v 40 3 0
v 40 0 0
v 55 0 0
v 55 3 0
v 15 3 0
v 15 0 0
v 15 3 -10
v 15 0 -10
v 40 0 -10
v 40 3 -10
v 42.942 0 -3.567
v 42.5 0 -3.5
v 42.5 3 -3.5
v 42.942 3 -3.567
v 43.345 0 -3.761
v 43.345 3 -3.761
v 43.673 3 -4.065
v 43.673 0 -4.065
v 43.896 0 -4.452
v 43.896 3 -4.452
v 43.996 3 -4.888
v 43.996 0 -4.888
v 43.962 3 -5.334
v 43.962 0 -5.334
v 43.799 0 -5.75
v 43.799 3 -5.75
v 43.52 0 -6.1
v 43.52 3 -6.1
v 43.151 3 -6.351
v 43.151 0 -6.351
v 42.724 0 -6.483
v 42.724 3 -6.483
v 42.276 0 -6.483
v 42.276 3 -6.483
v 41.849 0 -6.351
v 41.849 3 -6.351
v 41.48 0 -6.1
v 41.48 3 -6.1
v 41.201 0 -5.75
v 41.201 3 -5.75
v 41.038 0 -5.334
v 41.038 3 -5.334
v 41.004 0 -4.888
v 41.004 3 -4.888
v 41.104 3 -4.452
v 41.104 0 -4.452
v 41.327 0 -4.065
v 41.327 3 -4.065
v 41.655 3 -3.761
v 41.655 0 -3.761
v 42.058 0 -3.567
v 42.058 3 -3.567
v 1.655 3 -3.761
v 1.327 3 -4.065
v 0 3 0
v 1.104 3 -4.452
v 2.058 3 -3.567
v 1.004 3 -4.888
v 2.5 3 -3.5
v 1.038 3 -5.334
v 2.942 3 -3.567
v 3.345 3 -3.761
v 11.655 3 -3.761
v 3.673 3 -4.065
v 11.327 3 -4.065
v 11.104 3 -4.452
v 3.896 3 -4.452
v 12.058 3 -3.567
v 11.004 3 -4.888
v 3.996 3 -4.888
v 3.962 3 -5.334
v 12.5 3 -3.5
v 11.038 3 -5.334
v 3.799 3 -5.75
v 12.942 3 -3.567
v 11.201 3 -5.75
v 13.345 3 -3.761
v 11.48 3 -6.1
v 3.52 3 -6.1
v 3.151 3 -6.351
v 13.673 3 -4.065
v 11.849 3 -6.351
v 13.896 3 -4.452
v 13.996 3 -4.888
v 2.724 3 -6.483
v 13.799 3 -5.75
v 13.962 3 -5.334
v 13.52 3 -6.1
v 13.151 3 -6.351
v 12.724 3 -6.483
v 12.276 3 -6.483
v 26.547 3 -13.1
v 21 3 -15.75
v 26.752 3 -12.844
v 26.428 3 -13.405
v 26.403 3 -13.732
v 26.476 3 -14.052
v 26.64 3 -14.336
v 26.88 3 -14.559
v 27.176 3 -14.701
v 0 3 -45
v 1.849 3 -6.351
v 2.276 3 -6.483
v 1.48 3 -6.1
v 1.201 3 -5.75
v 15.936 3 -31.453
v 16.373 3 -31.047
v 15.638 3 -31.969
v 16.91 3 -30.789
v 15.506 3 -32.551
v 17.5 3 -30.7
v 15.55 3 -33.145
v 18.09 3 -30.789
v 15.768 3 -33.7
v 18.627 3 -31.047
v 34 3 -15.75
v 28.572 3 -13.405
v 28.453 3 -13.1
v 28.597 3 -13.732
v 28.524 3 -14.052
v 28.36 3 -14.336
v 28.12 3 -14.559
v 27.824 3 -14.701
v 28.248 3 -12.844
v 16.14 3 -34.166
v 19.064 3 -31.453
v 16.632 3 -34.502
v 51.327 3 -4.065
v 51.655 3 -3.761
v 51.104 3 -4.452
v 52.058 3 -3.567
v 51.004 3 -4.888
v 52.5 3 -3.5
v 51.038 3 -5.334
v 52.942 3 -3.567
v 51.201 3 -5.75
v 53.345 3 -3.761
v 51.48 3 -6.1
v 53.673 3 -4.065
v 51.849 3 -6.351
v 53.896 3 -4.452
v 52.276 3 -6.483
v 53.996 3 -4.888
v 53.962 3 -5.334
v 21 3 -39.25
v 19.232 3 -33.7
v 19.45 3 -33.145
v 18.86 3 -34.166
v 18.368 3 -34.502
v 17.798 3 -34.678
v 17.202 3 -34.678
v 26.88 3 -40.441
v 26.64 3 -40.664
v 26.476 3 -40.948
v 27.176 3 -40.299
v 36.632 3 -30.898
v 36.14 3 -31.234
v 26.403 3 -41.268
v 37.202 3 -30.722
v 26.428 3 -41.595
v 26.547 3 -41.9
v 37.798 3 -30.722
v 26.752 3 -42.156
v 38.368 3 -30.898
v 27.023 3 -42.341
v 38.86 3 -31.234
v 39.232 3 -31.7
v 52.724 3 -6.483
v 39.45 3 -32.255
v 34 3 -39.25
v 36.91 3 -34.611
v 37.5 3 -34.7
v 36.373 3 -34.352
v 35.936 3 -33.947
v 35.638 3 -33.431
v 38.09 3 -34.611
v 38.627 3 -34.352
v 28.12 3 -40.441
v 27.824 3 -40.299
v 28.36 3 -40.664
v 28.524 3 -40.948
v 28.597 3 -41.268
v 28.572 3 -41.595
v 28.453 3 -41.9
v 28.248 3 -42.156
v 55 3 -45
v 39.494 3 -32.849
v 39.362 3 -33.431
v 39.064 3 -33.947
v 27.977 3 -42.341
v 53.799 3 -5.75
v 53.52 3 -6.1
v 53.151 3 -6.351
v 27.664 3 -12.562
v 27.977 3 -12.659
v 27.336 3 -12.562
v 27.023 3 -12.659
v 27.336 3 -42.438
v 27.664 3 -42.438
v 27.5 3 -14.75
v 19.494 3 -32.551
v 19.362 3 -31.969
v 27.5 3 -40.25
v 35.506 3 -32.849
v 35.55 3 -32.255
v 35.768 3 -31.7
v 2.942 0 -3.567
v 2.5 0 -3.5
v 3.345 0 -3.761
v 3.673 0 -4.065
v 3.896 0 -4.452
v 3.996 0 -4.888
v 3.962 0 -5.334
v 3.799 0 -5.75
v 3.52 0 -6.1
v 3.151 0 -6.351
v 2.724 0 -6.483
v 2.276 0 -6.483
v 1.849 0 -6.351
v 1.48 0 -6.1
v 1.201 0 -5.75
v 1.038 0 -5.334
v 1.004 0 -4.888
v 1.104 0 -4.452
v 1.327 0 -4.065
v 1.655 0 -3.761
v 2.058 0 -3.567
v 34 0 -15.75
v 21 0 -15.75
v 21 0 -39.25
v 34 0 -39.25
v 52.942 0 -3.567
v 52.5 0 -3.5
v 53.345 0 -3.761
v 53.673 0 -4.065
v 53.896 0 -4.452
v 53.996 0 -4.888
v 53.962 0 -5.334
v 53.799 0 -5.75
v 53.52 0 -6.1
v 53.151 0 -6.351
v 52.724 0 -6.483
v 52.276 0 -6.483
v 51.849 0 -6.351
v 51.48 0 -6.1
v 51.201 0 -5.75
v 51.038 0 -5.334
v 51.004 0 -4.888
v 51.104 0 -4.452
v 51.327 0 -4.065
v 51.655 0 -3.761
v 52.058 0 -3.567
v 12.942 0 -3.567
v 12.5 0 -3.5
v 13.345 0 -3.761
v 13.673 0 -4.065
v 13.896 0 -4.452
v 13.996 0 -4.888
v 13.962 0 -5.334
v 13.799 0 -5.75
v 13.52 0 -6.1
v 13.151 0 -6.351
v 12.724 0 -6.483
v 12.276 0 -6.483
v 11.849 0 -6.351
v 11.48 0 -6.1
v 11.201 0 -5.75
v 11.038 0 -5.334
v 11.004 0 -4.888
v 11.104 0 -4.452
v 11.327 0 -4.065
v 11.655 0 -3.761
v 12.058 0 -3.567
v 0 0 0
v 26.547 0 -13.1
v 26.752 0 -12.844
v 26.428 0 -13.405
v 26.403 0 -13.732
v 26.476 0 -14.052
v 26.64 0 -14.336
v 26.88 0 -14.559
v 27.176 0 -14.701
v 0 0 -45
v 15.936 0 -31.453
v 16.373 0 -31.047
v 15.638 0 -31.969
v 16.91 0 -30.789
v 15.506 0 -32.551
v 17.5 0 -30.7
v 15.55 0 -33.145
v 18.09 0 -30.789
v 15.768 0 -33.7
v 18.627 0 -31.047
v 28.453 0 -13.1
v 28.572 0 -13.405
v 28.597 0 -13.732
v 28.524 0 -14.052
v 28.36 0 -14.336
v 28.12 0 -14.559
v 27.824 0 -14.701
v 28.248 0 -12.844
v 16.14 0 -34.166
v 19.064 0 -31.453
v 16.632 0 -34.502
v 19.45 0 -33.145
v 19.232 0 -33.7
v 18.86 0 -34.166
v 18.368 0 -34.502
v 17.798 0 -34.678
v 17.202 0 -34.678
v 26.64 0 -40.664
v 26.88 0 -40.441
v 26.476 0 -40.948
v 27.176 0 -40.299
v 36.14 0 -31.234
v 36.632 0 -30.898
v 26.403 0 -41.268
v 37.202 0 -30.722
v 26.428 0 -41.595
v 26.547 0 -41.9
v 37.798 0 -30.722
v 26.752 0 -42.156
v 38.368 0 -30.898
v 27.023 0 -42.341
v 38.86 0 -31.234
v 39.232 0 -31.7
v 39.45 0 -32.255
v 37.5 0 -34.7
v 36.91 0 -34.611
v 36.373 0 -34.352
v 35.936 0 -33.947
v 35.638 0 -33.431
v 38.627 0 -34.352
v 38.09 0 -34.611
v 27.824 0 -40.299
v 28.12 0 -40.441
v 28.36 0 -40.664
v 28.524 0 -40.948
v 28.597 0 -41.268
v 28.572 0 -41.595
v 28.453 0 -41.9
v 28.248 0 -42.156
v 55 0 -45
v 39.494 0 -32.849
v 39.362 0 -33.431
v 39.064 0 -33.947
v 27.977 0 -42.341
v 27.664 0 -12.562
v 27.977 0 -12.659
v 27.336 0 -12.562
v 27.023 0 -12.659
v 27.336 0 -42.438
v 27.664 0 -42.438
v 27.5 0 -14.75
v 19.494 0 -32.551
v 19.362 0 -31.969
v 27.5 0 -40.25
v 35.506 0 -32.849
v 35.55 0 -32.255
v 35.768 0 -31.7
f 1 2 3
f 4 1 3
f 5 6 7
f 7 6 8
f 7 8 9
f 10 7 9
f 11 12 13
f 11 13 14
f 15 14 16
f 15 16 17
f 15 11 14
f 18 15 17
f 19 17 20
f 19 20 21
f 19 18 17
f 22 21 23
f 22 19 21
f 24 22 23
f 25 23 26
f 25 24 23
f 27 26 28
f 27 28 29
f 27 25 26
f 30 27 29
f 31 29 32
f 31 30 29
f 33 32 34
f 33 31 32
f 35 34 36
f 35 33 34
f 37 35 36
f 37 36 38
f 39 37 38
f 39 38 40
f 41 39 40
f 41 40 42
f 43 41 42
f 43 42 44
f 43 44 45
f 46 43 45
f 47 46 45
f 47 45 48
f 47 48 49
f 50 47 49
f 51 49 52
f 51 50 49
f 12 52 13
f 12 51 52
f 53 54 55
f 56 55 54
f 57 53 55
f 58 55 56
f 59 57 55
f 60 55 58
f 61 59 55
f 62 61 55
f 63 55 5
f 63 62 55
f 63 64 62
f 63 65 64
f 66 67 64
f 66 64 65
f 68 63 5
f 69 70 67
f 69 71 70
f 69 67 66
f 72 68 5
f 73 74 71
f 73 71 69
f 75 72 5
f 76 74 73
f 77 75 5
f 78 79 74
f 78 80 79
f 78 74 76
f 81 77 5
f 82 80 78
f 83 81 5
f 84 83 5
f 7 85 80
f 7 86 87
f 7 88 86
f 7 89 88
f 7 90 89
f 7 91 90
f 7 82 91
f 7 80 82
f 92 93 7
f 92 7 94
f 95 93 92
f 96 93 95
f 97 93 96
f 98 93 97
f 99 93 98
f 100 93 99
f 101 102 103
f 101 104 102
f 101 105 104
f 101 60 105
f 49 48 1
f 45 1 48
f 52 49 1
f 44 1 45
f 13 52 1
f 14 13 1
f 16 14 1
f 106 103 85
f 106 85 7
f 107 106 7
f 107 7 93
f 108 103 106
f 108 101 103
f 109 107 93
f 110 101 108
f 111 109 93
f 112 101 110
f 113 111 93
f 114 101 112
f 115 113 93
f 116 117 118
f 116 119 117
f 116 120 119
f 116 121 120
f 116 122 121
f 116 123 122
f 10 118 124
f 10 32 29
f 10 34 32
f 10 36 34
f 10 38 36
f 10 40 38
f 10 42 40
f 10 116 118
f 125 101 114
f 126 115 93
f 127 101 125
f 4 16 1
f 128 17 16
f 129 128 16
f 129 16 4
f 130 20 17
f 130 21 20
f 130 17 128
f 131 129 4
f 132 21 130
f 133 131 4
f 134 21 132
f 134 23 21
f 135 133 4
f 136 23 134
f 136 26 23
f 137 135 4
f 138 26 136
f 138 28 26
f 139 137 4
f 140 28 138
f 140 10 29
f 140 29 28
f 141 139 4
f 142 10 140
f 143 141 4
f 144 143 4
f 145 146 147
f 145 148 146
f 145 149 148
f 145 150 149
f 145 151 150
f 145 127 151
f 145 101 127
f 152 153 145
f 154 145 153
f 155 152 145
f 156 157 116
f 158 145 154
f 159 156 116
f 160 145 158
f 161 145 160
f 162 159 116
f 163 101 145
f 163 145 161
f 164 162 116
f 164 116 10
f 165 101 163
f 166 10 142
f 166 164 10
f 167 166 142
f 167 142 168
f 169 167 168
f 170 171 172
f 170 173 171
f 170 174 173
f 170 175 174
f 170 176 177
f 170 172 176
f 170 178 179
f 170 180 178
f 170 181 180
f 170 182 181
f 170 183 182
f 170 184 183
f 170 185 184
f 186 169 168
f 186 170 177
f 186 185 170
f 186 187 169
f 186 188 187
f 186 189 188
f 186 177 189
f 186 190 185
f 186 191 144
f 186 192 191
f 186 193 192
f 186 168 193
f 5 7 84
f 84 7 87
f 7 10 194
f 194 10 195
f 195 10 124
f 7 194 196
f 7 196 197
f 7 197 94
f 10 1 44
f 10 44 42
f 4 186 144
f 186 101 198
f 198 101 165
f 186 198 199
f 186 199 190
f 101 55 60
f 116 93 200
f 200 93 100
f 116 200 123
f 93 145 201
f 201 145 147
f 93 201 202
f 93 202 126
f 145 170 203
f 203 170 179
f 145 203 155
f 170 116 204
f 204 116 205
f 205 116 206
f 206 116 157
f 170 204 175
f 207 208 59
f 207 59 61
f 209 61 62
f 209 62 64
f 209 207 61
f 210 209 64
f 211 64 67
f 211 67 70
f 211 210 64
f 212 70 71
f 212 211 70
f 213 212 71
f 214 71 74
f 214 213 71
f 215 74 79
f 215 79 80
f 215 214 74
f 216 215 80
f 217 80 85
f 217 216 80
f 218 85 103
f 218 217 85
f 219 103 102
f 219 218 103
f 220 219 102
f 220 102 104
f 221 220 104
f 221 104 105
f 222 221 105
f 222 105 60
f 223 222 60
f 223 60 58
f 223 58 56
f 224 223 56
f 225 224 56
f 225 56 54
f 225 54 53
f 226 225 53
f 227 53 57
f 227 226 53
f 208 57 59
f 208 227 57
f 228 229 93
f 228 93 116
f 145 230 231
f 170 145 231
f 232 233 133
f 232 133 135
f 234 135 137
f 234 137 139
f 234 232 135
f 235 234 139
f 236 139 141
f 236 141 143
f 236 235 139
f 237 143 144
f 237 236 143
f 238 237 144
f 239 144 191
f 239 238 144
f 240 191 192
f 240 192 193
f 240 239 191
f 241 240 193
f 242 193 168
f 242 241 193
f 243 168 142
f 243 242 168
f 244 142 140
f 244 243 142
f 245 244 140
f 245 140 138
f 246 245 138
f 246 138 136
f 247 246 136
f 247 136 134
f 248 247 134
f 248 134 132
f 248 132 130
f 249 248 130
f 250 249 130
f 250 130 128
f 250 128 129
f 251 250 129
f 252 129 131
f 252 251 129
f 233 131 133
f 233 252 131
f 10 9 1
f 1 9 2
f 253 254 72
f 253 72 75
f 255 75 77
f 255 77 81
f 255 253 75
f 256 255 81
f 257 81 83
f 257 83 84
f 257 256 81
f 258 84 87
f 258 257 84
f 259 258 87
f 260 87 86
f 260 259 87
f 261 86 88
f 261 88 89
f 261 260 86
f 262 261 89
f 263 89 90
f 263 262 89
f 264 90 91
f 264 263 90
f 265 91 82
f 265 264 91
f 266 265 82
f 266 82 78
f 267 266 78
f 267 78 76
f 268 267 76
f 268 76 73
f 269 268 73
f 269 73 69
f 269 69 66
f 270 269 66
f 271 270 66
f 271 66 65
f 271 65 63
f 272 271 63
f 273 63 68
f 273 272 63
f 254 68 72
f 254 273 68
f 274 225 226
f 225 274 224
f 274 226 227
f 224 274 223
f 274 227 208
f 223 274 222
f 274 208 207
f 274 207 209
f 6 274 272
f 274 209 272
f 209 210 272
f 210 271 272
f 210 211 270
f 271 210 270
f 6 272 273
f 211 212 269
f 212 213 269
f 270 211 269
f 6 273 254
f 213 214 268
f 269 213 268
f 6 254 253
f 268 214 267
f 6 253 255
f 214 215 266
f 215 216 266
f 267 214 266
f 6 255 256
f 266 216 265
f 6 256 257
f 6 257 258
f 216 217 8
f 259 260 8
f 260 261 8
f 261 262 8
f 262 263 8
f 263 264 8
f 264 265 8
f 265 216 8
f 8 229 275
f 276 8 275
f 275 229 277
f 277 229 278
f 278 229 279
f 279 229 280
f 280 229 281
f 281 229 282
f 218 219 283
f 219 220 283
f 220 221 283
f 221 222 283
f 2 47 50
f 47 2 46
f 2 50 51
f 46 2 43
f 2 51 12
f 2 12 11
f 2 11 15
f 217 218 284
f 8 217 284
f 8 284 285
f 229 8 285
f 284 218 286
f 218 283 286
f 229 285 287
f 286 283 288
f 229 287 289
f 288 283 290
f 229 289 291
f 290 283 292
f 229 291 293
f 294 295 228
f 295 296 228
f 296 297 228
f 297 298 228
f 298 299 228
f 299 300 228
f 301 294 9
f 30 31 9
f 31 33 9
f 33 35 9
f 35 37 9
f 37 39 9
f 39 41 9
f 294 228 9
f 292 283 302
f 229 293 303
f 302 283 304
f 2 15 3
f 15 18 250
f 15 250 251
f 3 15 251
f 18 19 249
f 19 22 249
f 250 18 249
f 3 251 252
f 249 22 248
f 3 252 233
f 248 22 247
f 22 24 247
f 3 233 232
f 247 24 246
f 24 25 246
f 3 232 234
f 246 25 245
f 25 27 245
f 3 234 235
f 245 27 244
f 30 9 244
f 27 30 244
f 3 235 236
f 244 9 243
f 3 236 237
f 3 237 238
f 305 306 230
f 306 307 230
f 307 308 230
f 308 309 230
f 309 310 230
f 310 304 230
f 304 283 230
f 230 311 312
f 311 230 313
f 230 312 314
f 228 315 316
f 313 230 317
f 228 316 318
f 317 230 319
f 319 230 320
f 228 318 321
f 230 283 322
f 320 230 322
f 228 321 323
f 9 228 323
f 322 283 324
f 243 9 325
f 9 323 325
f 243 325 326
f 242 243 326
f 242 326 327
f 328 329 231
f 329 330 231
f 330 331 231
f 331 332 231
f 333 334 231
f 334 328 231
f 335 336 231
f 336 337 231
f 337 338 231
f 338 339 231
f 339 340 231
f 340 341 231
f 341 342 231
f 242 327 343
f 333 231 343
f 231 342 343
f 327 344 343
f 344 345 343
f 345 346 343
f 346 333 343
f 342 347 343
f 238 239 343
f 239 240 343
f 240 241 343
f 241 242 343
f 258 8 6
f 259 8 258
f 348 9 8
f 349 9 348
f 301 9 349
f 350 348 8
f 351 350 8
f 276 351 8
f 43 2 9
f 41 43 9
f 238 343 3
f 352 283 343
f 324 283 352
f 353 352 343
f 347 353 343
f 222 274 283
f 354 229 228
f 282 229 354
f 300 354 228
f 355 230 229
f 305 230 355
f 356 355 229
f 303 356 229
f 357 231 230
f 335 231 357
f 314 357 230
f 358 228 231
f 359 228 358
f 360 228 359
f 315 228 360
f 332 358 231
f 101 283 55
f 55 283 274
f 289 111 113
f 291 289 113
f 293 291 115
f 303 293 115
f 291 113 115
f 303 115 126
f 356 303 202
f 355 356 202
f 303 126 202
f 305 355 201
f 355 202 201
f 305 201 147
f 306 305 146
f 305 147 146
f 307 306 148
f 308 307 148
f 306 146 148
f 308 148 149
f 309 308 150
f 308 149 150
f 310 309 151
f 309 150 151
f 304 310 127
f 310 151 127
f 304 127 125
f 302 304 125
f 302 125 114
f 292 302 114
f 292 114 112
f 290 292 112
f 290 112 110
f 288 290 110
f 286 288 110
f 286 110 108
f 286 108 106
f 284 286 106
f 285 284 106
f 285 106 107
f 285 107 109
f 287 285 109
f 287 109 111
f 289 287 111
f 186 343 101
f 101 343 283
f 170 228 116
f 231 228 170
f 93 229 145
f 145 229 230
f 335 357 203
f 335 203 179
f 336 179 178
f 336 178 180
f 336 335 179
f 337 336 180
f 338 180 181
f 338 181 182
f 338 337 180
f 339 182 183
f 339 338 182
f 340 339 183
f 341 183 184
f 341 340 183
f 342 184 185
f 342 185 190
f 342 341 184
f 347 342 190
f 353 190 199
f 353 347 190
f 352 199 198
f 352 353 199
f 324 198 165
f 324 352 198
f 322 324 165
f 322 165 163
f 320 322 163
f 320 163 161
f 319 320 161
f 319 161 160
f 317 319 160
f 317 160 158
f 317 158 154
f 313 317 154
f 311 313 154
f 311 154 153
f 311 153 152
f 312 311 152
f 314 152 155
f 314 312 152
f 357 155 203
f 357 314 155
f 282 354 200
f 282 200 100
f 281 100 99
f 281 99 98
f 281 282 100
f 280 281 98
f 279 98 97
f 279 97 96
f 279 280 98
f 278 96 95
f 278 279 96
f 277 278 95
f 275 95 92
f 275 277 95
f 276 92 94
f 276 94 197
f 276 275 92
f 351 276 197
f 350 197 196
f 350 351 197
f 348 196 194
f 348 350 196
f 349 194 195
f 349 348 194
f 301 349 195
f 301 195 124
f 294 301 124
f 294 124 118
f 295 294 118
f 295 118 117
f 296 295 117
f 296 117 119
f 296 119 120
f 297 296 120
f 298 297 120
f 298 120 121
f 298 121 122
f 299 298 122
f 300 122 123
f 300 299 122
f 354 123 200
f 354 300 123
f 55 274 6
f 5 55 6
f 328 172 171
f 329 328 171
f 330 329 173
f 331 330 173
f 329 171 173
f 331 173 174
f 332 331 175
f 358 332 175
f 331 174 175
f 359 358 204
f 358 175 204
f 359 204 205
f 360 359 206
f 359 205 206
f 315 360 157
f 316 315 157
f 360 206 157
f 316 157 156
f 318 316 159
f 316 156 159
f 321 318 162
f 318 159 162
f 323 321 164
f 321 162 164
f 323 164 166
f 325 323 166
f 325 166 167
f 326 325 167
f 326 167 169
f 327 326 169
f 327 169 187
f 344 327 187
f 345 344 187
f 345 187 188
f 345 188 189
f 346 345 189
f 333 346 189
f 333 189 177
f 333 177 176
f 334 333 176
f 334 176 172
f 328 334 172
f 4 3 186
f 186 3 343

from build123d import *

# Parameters (mm, degrees)
SKETCH1_R           = 1.5
SKETCH1_R_2         = 1.1
SKETCH1_W           = 13
SKETCH1_H           = 23.5
BOSS_EXTRUDE1_DEPTH = 3
SKETCH2_R           = 2
CUT_EXTRUDE1_DEPTH  = 72.126647608


with BuildPart() as part:
    # Sketch1 → Boss-Extrude1 (new body)
    with BuildSketch(Plane(origin=(0, 0, 0), x_dir=(1, 0, 0), z_dir=(0, 1, 0))):
        Polygon((0, 0), (15, 0), (15, 10), (40, 10), (40, 0), (55, 0), (55, 45), (0, 45), align=None)
        with Locations(Location((42.5, 5, 0), (0, 0, 270))):
            Circle(SKETCH1_R, mode=Mode.SUBTRACT)
        with Locations(Location((52.5, 5, 0), (0, 0, 270))):
            Circle(SKETCH1_R, mode=Mode.SUBTRACT)
        with Locations(Location((12.5, 5, 0), (0, 0, 270))):
            Circle(SKETCH1_R, mode=Mode.SUBTRACT)
        with Locations(Location((2.5, 5, 0), (0, 0, 270))):
            Circle(SKETCH1_R, mode=Mode.SUBTRACT)
        with Locations(Location((27.5, 41.35, 0), (0, 0, 270))):
            Circle(SKETCH1_R_2, mode=Mode.SUBTRACT)
        with Locations(Location((27.5, 13.65, 0), (0, 0, 90))):
            Circle(SKETCH1_R_2, mode=Mode.SUBTRACT)
        with Locations((27.5, 27.5)):
            Rectangle(SKETCH1_W, SKETCH1_H, mode=Mode.SUBTRACT)
    extrude(amount=BOSS_EXTRUDE1_DEPTH)

    # Sketch2 → Cut-Extrude1 (cut, through all)
    with BuildSketch(Plane(origin=(0, 3, 0), x_dir=(1, 0, 0), z_dir=(0, 1, 0))):
        with Locations(Location((17.5, 32.699969783, 0), (0, 0, 270))):
            Circle(SKETCH2_R)
        with Locations(Location((37.5, 32.699969783, 0), (0, 0, 90))):
            Circle(SKETCH2_R)
    extrude(amount=-CUT_EXTRUDE1_DEPTH, mode=Mode.SUBTRACT)


solid = part.part
